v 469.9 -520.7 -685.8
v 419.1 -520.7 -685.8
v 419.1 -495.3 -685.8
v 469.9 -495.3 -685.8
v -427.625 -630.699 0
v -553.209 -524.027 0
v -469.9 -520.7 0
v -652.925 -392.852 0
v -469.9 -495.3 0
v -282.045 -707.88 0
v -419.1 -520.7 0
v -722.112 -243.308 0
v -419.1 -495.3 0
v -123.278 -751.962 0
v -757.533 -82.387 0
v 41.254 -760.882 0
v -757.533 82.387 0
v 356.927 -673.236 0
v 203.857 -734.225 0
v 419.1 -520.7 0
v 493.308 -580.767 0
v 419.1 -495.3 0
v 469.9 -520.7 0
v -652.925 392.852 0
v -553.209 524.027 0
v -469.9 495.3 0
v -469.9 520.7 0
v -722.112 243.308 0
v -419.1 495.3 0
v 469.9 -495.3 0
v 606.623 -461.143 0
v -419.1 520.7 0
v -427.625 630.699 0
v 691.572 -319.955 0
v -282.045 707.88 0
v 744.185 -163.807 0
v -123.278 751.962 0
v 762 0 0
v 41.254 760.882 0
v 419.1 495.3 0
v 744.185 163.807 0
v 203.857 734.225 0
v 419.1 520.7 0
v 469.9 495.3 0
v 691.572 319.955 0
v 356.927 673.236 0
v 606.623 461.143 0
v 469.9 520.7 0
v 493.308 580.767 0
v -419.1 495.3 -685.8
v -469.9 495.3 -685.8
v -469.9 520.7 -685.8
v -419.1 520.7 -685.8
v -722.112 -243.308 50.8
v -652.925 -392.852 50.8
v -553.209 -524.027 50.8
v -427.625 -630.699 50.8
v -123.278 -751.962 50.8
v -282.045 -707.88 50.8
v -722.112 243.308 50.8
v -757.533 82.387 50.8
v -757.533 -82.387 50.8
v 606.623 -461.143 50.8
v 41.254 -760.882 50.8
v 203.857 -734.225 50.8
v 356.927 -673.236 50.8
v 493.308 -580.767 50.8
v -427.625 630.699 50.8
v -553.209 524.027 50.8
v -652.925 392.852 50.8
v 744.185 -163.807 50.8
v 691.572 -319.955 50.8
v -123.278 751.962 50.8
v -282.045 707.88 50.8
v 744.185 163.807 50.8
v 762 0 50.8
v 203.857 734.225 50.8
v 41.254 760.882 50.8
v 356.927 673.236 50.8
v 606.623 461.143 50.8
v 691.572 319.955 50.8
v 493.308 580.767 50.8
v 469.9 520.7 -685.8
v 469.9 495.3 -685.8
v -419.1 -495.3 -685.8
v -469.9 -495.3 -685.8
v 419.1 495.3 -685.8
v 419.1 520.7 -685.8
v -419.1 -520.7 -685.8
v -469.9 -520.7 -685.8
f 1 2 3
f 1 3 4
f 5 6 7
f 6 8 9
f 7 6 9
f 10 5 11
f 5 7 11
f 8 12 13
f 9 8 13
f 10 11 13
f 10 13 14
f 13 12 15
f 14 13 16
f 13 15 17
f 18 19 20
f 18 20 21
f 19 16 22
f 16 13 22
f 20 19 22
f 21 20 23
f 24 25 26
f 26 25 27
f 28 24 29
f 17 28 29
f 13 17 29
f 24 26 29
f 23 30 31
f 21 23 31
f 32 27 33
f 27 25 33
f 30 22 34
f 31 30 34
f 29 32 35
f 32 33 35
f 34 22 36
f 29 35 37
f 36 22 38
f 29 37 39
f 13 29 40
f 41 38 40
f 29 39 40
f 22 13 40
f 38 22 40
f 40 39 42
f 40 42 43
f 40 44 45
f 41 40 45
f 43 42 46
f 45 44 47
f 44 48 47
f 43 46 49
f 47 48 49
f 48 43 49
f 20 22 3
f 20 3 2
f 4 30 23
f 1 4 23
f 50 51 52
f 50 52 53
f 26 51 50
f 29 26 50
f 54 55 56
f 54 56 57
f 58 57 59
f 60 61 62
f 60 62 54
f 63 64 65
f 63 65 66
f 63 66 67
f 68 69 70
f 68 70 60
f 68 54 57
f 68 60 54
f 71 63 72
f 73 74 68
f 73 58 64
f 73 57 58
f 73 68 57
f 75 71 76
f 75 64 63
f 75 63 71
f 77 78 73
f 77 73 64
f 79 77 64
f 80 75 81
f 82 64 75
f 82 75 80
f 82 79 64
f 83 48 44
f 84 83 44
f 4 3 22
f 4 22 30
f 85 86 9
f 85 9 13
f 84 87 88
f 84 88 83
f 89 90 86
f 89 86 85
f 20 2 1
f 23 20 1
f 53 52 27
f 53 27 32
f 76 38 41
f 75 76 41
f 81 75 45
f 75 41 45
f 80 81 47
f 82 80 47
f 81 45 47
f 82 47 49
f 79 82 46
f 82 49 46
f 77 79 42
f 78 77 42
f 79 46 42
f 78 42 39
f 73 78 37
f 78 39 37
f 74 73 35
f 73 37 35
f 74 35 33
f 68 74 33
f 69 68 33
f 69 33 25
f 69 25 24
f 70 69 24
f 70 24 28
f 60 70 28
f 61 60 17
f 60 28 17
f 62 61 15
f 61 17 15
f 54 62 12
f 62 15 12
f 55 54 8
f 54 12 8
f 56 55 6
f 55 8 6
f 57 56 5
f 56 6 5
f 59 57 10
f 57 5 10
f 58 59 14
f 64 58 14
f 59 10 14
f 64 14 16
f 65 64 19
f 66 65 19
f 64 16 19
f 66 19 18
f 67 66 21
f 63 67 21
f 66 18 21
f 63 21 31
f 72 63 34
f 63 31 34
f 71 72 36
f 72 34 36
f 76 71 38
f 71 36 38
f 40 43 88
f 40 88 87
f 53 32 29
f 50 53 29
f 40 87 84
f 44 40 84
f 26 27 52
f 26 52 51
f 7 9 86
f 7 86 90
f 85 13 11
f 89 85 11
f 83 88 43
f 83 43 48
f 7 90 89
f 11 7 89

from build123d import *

# Parameters (mm, degrees)
F0_R     = 762
F1_DEPTH = 50.8
F2_W     = 50.8
F2_H     = 25.4
F3_DEPTH = 685.8


with BuildPart() as f1:
    # F0 (on Top) → F1 (new body)
    with BuildSketch(Plane.XY):
        Circle(F0_R)
    extrude(amount=F1_DEPTH)

    # F2 (on face) → F3 (join)
    with BuildSketch(Plane(origin=(0, 0, 0), x_dir=(1, 0, 0), z_dir=(0, 0, -1))):
        with Locations((-444.5, 508)):
            Rectangle(F2_W, F2_H)
        with Locations((444.5, 508)):
            Rectangle(F2_W, F2_H)
        with Locations((-444.5, -508)):
            Rectangle(F2_W, F2_H)
        with Locations((444.5, -508)):
            Rectangle(F2_W, F2_H)
    extrude(amount=F3_DEPTH)


solid = f1.part
